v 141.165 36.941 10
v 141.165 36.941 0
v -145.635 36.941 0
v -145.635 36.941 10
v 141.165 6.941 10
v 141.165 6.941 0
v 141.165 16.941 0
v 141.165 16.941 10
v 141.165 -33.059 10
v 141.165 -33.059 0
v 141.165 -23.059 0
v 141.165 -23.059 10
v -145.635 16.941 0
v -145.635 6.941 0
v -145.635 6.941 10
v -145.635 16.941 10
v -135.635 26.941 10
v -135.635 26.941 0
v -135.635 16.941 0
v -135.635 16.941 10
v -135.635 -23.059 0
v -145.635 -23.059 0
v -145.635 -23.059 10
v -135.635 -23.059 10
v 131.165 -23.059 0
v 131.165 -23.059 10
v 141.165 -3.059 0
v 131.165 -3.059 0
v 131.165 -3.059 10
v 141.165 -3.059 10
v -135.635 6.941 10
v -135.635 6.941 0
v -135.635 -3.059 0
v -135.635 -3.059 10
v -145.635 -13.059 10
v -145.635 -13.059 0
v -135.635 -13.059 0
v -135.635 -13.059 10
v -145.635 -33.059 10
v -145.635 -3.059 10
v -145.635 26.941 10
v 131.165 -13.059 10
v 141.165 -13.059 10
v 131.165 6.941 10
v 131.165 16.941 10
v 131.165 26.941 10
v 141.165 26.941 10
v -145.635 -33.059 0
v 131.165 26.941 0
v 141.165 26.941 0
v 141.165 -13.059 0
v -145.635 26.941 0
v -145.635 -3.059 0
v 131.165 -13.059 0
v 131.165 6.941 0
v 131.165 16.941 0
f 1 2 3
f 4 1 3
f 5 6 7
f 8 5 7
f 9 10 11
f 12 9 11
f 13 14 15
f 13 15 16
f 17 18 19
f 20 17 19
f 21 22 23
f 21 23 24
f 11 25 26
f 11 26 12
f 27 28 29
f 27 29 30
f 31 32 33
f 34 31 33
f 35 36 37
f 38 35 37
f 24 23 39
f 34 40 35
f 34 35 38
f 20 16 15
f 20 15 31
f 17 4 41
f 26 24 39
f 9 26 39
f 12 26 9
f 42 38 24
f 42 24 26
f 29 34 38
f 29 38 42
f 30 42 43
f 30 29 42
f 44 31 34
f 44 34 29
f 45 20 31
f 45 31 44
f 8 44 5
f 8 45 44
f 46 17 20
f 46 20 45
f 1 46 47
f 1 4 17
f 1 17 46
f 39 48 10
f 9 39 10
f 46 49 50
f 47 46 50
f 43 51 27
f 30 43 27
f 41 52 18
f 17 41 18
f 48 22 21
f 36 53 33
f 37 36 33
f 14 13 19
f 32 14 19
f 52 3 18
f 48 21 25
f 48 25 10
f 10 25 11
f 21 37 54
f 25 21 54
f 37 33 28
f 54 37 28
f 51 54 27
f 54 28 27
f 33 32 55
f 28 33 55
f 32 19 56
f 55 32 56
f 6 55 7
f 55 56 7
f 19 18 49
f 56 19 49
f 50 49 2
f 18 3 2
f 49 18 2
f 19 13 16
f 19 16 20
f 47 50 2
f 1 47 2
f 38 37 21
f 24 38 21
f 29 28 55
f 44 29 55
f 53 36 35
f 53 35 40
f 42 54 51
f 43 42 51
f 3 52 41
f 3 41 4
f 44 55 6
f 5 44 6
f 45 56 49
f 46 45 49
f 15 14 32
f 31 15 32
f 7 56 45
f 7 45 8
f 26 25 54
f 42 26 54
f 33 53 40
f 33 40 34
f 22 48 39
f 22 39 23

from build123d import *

# Parameters (mm, degrees)
F0_W     = 10
F0_H     = 10
F1_DEPTH = 10


# Not quite as in the source:
# - a feature names something its author has since deleted; it is built from what else it names


with BuildPart() as f1:
    # F0 (on Top) → F1 (new body)
    with BuildSketch(Plane.XY):
        Polygon((131.1653250098, 36.9413525529), (-135.6346749902, 36.9413525529), (-135.6346749902, 26.9413525529), (-135.6346749902, 16.9413525529), (-135.6346749902, 6.9413525529), (-135.6346749902, -3.0586474471), (-135.6346749902, -13.0586474471), (-135.6346749902, -23.0586474471), (-135.6346749902, -33.0586474471), (131.1653250098, -33.0586474471), (131.1653250098, -23.0586474471), (131.1653250098, -13.0586474471), (131.1653250098, -3.0586474471), (131.1653250098, 6.9413525529), (131.1653250098, 16.9413525529), (131.1653250098, 26.9413525529), align=None)
        with Locations((-140.6346749902, 31.9413525529)):
            Rectangle(F0_W, F0_H)
        with Locations((-140.6346749902, 11.9413525529)):
            Rectangle(F0_W, F0_H)
        with Locations((-140.6346749902, -8.0586474471)):
            Rectangle(F0_W, F0_H)
        with Locations((-140.6346749902, -28.0586474471)):
            Rectangle(F0_W, F0_H)
        with Locations((136.1653250098, 31.9413525529)):
            Rectangle(F0_W, F0_H)
        with Locations((136.1653250098, 11.9413525529)):
            Rectangle(F0_W, F0_H)
        with Locations((136.1653250098, -8.0586474471)):
            Rectangle(F0_W, F0_H)
        with Locations((136.1653250098, -28.0586474471)):
            Rectangle(F0_W, F0_H)
    extrude(amount=F1_DEPTH)


solid = f1.part
